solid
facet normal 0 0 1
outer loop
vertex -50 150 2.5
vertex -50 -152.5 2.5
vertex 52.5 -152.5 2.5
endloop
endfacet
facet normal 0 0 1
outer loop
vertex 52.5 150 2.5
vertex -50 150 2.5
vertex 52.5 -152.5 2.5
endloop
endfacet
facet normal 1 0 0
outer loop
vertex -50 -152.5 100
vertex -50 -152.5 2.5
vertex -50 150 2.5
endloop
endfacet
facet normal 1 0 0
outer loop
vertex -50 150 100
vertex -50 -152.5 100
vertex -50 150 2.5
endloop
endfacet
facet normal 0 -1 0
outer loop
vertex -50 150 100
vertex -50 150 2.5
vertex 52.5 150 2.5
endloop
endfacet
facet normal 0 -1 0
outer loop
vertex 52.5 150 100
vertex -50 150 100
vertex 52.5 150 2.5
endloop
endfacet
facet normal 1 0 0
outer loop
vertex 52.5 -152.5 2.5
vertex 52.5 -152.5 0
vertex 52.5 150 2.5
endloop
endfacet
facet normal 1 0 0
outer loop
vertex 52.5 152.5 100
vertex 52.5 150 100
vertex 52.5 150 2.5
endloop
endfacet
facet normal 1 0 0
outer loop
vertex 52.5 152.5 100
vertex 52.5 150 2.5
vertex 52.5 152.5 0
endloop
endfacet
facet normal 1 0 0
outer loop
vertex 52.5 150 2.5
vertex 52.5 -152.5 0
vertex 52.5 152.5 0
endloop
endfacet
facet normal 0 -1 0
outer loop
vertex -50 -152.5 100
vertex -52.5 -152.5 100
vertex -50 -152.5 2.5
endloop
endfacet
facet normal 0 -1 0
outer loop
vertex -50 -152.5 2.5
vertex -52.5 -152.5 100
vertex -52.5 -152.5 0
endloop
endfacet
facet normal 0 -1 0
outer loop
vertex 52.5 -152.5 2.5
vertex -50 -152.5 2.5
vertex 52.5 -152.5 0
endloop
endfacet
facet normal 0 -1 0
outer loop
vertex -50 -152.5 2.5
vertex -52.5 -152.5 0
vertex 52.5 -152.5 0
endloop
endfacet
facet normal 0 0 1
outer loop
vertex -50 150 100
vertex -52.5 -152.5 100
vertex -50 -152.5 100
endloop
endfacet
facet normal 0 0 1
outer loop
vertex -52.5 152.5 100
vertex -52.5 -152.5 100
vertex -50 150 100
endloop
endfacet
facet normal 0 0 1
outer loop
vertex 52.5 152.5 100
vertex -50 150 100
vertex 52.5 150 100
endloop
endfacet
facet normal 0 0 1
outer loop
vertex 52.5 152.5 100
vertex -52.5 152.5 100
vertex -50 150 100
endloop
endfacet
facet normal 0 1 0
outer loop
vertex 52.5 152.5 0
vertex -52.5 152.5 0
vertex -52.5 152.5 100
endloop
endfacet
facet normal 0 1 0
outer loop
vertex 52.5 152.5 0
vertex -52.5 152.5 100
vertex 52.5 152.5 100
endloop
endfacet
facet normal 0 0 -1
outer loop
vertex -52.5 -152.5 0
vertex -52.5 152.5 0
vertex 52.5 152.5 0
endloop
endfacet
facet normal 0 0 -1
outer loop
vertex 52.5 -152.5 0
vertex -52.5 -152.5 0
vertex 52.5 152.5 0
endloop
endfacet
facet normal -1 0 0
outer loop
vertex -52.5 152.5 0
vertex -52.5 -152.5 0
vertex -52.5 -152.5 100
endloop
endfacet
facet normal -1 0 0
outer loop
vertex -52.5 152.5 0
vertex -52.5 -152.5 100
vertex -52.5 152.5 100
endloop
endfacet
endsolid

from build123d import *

# Parameters (mm, degrees)
F0_W     = 105
F0_H     = 305
F1_DEPTH = 100
F2_T     = -2.5


with BuildPart() as f1:
    # F0 (on Top) → F1 (new body)
    with BuildSketch(Plane.XY):
        Rectangle(F0_W, F0_H)
    extrude(amount=F1_DEPTH)

    # F2
    f2_openings = [f1.faces().sort_by_distance(p)[0] for p in [
        (0, 0, 100),
        (52.5, 0, 50),
        (0, -152.5, 50),
    ]]
    offset(amount=F2_T, openings=f2_openings)


solid = f1.part
